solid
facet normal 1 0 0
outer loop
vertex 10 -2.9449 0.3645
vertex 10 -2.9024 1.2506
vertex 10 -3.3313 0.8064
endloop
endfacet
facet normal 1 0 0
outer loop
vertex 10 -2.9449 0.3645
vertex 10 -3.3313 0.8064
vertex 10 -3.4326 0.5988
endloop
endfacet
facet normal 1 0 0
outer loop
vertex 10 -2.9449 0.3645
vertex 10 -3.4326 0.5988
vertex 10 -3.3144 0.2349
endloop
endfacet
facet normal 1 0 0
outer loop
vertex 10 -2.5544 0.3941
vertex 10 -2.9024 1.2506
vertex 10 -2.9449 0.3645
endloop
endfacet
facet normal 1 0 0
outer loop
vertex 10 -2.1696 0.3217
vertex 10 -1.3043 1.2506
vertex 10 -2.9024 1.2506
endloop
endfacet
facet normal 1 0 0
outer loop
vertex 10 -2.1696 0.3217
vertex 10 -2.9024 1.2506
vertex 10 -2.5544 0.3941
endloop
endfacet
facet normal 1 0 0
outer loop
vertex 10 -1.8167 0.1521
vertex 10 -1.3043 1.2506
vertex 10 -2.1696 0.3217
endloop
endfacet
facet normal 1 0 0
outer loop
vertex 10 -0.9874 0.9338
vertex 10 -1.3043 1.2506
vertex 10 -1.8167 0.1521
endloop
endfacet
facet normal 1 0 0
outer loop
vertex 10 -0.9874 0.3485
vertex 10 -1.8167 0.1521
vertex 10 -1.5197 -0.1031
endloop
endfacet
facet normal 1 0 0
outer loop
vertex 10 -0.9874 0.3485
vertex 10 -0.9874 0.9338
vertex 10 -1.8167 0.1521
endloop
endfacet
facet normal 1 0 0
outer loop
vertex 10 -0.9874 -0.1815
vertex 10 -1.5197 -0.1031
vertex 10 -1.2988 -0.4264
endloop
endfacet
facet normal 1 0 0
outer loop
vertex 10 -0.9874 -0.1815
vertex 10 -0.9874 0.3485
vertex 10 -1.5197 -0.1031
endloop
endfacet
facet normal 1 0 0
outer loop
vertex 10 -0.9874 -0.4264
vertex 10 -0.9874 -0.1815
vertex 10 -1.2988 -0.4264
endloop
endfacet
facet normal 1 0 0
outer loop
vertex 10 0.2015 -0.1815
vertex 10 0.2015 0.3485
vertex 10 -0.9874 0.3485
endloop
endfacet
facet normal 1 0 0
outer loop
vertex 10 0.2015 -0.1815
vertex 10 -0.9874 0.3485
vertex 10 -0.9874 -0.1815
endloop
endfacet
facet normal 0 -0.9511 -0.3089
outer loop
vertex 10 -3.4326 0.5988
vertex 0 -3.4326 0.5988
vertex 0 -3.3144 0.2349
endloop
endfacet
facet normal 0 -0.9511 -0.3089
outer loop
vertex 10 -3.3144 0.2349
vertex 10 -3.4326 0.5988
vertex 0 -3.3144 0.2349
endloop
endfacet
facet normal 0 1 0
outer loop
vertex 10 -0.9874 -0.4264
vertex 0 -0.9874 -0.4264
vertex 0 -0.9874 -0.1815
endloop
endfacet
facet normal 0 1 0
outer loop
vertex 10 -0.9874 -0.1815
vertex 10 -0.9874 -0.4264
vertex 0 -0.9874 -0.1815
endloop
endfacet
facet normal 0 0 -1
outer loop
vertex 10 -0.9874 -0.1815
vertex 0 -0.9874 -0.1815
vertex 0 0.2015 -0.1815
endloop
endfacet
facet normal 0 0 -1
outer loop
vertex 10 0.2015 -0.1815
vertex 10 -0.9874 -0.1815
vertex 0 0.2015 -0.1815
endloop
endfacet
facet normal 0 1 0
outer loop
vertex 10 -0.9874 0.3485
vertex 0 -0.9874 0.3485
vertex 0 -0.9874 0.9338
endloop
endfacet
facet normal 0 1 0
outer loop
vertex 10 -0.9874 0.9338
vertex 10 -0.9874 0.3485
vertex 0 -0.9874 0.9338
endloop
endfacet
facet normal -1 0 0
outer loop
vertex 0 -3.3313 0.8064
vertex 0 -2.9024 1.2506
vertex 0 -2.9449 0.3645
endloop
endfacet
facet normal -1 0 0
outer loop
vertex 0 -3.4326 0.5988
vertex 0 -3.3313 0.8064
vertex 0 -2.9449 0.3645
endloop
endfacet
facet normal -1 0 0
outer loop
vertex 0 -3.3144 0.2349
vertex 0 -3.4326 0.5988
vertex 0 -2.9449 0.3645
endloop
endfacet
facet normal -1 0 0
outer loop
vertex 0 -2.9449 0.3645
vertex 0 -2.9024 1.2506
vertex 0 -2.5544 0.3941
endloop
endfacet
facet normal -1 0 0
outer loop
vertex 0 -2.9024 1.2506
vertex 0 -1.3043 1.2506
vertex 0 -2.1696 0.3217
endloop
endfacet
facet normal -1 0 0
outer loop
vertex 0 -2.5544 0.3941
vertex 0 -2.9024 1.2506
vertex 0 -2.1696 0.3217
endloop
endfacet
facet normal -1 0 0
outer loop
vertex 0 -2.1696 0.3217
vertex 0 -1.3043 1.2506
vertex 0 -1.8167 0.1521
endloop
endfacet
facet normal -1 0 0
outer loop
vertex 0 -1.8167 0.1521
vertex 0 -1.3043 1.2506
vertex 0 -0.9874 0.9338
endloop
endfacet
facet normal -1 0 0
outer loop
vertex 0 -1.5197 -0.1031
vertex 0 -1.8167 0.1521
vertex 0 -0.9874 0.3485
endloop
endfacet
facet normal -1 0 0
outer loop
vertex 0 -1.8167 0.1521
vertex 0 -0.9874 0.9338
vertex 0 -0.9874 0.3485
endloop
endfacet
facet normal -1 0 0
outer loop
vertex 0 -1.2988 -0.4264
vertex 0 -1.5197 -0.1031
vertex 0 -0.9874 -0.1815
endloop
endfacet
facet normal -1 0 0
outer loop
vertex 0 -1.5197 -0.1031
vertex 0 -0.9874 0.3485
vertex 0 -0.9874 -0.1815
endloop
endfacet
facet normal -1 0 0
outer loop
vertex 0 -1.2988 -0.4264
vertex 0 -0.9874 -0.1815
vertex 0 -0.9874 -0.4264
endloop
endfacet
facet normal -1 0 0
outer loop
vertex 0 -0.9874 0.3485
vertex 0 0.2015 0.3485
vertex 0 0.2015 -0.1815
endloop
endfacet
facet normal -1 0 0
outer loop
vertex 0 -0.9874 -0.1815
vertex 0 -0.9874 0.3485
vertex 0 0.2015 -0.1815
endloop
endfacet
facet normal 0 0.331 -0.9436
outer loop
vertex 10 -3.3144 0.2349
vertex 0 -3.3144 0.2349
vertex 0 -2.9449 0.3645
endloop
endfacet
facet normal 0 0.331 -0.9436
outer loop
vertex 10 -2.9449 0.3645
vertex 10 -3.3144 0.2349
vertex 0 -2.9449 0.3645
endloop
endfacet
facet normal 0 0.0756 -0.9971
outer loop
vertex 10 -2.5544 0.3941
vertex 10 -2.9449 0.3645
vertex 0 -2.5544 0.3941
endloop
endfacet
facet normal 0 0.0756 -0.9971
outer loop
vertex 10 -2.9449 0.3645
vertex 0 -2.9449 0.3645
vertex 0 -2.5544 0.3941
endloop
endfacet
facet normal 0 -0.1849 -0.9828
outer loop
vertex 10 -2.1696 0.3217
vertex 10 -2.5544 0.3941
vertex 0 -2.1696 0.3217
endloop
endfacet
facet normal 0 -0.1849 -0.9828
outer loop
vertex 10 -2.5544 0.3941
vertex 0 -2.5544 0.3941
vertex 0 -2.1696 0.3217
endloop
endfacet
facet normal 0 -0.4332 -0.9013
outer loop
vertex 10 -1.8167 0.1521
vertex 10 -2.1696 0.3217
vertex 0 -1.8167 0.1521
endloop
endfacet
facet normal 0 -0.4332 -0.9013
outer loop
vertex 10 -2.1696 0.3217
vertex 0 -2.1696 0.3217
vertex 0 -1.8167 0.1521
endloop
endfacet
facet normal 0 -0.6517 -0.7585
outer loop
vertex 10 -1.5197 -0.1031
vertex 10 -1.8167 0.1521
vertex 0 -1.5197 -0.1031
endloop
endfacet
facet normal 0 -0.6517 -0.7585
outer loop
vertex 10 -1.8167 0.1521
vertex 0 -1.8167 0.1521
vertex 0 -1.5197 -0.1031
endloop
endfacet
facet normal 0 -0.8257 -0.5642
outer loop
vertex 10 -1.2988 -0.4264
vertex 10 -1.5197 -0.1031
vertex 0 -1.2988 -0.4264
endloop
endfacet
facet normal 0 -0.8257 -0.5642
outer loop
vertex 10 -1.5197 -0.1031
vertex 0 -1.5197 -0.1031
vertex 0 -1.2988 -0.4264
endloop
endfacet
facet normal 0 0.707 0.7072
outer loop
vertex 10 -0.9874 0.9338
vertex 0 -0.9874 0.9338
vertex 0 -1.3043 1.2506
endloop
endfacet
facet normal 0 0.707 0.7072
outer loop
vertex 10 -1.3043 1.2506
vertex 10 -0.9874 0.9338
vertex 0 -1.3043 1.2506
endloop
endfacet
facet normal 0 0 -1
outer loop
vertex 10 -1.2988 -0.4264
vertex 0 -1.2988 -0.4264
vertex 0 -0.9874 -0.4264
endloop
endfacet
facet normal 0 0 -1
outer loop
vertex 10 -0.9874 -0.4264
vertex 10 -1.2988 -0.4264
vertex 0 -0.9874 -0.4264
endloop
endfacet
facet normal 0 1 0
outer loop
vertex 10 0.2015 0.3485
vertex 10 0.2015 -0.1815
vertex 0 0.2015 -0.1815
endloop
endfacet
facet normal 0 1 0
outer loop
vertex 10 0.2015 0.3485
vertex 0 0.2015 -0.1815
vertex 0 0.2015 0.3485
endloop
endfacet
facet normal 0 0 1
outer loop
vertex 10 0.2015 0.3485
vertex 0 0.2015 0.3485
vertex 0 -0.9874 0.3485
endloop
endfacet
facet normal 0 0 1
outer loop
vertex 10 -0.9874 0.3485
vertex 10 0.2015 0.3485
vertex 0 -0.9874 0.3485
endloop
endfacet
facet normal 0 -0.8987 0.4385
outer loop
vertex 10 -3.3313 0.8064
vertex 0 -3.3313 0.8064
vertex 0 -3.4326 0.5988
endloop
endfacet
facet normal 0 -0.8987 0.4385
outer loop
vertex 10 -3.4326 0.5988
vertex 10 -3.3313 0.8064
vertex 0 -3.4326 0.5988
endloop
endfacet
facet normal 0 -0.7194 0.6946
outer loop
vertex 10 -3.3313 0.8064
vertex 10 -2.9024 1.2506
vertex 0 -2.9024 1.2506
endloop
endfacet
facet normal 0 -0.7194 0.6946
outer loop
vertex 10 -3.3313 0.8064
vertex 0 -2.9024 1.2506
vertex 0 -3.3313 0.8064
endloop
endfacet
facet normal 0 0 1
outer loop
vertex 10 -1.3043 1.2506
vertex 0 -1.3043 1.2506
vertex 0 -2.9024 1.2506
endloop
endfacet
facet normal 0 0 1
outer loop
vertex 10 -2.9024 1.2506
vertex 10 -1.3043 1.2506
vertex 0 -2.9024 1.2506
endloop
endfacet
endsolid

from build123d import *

# Parameters (mm, degrees)
BOSS_EXTRUDE2_DEPTH = 10


with BuildPart() as part:
    # Sketch1 → Boss-Extrude2 (new body)
    with BuildSketch(Plane(origin=(0, 0, 0), x_dir=(0, 0, -1), z_dir=(1, 0, 0))):
        with BuildLine():
            Line((0.181484262, 0.201549296), (-0.348515738, 0.201549296))
            Line((-0.348515738, 0.201549296), (-0.348515738, -0.987434189))
            Line((-0.348515738, -0.987434189), (-0.933817853, -0.987434189))
            Line((-0.933817853, -0.987434189), (-1.25063724, -1.304253576))
            Line((-1.25063724, -1.304253576), (-1.25063724, -2.902375908))
            Line((-1.25063724, -2.902375908), (-0.806436057, -3.331336004))
            Line((-0.806436057, -3.331336004), (-0.598754104, -3.432629261))
            Line((-0.598754104, -3.432629261), (-0.234865404, -3.314394655))
            ThreePointArc((-0.234865404, -3.314394655), (-0.321657185, -2.169629757), (0.42644278, -1.298787678))
            Line((0.42644278, -1.298787678), (0.42644278, -0.987434189))
            Line((0.42644278, -0.987434189), (0.181484262, -0.987434189))
            Line((0.181484262, -0.987434189), (0.181484262, 0.201549296))
        make_face()
    extrude(amount=BOSS_EXTRUDE2_DEPTH)


solid = part.part
